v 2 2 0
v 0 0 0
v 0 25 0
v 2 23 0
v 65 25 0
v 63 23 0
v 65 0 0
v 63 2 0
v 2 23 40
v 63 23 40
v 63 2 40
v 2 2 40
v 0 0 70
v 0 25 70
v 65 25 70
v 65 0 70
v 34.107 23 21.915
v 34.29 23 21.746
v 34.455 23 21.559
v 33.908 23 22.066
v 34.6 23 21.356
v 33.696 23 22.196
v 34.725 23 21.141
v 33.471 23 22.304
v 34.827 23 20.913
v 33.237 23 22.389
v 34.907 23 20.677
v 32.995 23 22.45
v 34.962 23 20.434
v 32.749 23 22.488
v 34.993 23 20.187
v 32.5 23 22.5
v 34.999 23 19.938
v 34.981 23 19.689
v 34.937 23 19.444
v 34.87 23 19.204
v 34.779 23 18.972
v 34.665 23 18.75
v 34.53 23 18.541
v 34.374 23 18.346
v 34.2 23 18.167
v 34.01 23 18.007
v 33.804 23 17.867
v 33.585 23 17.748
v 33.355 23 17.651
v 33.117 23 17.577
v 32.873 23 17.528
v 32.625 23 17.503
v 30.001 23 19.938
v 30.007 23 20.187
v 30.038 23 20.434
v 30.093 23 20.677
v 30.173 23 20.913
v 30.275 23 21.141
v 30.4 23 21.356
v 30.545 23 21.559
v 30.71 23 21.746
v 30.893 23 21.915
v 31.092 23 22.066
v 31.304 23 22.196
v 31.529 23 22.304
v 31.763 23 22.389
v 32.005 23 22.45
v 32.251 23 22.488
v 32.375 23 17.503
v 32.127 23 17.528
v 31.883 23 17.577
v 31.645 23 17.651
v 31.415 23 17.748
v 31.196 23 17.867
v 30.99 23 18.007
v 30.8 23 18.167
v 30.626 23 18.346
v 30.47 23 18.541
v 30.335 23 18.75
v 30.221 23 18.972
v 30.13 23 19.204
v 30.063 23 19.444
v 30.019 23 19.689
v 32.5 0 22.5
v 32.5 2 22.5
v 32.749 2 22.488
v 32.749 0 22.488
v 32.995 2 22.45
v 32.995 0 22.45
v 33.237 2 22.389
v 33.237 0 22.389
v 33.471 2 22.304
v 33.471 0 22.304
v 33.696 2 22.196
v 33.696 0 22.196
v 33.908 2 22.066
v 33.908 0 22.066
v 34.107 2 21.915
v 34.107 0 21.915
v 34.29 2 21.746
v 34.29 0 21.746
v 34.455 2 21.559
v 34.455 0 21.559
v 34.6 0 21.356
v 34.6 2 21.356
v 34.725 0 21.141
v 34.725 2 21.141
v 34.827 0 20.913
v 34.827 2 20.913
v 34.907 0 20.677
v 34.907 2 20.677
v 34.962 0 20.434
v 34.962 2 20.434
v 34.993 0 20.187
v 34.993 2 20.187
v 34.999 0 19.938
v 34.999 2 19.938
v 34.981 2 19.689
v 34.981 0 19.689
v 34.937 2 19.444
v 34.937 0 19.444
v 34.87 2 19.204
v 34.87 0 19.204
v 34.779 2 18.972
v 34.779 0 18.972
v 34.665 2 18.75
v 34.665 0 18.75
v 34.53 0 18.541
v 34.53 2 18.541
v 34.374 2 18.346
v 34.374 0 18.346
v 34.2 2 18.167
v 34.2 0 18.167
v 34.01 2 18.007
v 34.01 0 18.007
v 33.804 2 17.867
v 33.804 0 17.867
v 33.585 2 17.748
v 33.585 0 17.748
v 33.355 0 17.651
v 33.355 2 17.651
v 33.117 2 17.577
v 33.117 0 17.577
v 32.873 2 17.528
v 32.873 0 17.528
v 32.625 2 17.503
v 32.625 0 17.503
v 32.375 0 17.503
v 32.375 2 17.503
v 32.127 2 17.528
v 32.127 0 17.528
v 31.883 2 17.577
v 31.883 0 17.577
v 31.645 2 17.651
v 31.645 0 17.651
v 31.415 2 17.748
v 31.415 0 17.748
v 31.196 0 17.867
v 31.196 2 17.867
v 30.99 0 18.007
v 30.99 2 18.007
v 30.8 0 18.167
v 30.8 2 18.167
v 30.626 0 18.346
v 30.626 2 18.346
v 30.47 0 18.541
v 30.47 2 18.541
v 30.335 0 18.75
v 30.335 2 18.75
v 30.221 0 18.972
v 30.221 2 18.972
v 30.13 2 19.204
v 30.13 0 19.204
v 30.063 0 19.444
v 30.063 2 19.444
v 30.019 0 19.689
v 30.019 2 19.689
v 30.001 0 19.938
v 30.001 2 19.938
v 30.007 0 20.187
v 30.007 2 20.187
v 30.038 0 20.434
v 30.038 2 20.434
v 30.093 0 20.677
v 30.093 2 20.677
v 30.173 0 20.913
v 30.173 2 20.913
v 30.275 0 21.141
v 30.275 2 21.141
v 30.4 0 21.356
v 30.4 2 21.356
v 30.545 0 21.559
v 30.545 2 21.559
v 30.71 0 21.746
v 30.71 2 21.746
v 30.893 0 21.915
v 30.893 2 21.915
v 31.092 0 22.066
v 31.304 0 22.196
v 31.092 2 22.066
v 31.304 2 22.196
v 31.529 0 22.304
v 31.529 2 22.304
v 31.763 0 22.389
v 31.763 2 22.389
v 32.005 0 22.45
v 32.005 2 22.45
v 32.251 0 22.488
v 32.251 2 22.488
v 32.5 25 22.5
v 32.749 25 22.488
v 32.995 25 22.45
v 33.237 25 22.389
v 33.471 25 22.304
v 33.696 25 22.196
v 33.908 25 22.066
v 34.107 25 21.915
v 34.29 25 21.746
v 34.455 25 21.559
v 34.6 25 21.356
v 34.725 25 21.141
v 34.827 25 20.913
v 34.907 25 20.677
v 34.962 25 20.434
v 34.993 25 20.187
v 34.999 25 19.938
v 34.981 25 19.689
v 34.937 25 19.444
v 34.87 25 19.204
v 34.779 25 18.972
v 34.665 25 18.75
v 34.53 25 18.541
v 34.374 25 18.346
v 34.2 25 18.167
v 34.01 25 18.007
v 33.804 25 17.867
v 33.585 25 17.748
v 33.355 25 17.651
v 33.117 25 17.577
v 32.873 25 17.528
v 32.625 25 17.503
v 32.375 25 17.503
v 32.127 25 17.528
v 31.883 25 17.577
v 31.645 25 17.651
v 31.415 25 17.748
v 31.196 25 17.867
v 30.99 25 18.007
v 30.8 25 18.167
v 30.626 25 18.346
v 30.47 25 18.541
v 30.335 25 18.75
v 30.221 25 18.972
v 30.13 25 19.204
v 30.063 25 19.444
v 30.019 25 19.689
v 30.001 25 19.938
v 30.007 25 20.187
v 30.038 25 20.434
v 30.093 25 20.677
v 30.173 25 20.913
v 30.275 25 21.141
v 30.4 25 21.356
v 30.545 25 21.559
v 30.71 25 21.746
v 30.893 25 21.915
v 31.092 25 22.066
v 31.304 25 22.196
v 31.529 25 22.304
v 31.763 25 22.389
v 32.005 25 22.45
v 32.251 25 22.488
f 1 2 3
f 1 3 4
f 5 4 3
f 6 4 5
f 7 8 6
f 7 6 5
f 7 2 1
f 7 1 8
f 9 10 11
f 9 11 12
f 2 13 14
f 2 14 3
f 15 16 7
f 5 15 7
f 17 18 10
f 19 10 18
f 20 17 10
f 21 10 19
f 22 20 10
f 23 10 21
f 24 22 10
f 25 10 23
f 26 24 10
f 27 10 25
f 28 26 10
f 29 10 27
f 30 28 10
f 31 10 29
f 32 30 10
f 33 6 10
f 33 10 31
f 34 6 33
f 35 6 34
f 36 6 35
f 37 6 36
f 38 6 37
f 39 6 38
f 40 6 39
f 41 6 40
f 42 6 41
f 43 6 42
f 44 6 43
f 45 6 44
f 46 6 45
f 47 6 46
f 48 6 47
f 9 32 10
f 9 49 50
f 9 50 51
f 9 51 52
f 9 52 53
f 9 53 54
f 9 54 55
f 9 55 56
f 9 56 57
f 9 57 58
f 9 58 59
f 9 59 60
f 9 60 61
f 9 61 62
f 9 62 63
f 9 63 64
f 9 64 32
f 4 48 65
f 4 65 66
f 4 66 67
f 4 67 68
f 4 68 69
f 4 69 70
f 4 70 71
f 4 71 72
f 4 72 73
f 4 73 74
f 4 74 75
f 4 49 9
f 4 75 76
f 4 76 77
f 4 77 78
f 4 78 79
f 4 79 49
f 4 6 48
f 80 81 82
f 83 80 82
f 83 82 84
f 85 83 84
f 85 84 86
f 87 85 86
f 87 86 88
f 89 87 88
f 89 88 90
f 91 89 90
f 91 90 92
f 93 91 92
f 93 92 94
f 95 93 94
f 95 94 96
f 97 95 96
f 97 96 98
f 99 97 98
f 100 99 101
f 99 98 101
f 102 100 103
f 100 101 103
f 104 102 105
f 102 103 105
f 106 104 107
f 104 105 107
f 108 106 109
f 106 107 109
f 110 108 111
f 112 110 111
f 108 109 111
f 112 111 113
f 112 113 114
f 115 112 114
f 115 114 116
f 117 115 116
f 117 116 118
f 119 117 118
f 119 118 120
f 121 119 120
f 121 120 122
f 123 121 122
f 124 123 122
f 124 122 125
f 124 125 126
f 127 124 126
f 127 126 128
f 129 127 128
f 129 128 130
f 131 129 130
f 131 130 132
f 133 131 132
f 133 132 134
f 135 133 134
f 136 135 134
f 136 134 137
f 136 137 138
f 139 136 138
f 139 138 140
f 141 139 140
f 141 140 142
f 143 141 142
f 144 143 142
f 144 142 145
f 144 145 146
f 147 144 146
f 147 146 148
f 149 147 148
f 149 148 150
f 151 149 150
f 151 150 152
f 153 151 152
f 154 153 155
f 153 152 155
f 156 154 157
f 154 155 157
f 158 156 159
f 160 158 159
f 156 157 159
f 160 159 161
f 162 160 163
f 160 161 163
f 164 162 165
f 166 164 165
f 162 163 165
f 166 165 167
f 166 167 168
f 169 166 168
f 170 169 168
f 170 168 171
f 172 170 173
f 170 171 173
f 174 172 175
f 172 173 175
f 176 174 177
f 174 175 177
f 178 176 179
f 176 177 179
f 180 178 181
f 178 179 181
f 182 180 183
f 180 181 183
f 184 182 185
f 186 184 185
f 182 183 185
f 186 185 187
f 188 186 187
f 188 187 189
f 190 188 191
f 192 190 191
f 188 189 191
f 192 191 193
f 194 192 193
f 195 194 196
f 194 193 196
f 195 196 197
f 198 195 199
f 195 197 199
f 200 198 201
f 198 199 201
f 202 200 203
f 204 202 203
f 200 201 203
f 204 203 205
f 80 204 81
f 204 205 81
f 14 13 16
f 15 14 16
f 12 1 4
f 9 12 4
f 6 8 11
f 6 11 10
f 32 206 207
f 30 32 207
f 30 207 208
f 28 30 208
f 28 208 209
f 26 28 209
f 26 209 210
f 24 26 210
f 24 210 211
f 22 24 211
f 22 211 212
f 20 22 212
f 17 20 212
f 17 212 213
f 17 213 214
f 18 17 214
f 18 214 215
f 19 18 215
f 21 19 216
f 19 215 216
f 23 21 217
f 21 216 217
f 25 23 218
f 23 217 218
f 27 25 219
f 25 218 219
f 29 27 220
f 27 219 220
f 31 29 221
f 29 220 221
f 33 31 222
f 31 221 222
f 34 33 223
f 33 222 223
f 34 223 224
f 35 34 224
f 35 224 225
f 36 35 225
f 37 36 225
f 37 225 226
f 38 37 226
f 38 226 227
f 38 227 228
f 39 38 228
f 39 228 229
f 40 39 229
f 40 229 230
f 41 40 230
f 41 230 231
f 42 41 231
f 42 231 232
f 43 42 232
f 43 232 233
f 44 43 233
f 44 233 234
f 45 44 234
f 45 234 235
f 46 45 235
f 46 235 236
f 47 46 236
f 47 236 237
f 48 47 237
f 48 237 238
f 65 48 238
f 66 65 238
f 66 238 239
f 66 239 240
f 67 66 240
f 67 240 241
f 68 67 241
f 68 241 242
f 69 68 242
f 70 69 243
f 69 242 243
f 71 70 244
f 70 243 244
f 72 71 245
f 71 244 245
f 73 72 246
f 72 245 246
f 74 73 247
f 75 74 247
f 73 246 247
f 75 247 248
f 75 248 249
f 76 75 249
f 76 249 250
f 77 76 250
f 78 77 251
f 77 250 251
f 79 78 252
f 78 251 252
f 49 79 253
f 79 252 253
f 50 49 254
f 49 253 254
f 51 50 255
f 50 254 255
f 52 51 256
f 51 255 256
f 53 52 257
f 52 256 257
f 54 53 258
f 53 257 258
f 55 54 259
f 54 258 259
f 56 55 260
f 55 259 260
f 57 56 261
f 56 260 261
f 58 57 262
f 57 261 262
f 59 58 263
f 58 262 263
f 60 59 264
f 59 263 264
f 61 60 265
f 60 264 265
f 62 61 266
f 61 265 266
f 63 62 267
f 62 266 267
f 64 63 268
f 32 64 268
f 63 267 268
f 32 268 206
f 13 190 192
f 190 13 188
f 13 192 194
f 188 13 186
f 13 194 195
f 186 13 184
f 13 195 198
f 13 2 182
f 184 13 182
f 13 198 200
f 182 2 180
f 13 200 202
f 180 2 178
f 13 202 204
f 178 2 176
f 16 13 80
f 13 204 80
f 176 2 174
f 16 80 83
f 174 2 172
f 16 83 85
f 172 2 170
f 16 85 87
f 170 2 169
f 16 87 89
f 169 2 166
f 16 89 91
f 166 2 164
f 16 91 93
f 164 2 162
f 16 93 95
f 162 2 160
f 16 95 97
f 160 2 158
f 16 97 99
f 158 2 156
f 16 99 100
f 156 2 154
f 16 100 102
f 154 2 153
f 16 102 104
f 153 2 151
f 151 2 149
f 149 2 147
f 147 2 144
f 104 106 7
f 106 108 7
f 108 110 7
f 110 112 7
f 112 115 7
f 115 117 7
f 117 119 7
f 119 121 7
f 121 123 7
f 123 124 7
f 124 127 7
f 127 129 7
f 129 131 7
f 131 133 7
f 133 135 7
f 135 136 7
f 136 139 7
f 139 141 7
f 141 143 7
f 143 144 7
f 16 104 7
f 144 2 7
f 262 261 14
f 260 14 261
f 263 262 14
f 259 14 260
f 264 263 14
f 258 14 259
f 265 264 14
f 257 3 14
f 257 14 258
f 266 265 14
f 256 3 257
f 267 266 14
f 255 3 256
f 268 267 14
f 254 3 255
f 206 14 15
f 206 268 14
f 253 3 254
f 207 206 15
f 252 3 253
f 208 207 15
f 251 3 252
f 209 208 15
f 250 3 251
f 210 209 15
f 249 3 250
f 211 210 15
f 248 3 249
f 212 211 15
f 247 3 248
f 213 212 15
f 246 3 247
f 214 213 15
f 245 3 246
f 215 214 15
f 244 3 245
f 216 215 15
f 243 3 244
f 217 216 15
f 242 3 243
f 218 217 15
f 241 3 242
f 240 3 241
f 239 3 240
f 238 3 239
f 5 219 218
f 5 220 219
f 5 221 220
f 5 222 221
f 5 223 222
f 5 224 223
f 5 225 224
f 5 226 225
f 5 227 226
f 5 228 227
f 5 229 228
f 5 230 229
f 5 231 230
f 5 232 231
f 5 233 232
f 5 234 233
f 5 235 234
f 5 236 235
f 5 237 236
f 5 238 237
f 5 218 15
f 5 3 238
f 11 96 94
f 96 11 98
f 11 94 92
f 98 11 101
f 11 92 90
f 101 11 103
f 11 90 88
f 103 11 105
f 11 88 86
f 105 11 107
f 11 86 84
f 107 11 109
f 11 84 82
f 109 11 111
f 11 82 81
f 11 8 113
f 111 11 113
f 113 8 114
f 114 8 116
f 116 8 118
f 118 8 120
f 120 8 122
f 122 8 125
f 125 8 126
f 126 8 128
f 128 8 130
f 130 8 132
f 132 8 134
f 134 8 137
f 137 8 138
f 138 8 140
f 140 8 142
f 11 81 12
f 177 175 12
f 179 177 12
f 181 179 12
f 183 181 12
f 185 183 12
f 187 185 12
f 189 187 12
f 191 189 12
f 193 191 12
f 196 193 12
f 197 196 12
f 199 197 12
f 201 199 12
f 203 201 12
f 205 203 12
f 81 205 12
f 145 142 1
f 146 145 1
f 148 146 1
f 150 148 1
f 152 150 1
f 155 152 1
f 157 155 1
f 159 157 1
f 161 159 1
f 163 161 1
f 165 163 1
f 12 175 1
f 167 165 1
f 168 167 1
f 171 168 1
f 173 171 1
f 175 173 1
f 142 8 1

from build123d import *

# Parameters (mm, degrees)
SKETCH1_W           = 65
SKETCH1_H           = 70
BOSS_EXTRUDE1_DEPTH = 25
SKETCH8_W           = 61
SKETCH8_H           = 21
CUT_EXTRUDE1_DEPTH  = 40
SKETCH9_R           = 2.5
CUT_EXTRUDE2_DEPTH  = 30


with BuildPart() as part:
    # Sketch1 → Boss-Extrude1 (new body)
    with BuildSketch(Plane(origin=(0, 0, 0), x_dir=(1, 0, 0), z_dir=(0, 1, 0))):
        with Locations((32.5, -35)):
            Rectangle(SKETCH1_W, SKETCH1_H)
    extrude(amount=BOSS_EXTRUDE1_DEPTH)

    # Sketch8 → Cut-Extrude1 (cut)
    with BuildSketch(Plane(origin=(0, 0, 0), x_dir=(-1, 0, 0), z_dir=(0, 0, -1))):
        with Locations((-32.5, 12.5)):
            Rectangle(SKETCH8_W, SKETCH8_H)
    extrude(amount=-CUT_EXTRUDE1_DEPTH, mode=Mode.SUBTRACT)

    # Sketch9 → Cut-Extrude2 (cut)
    with BuildSketch(Plane(origin=(0, 25, 0), x_dir=(1, 0, 0), z_dir=(0, 1, 0))):
        with Locations(Location((32.5, -20, 0), (0, 0, 270))):
            Circle(SKETCH9_R)
    extrude(amount=-CUT_EXTRUDE2_DEPTH, mode=Mode.SUBTRACT)


solid = part.part
